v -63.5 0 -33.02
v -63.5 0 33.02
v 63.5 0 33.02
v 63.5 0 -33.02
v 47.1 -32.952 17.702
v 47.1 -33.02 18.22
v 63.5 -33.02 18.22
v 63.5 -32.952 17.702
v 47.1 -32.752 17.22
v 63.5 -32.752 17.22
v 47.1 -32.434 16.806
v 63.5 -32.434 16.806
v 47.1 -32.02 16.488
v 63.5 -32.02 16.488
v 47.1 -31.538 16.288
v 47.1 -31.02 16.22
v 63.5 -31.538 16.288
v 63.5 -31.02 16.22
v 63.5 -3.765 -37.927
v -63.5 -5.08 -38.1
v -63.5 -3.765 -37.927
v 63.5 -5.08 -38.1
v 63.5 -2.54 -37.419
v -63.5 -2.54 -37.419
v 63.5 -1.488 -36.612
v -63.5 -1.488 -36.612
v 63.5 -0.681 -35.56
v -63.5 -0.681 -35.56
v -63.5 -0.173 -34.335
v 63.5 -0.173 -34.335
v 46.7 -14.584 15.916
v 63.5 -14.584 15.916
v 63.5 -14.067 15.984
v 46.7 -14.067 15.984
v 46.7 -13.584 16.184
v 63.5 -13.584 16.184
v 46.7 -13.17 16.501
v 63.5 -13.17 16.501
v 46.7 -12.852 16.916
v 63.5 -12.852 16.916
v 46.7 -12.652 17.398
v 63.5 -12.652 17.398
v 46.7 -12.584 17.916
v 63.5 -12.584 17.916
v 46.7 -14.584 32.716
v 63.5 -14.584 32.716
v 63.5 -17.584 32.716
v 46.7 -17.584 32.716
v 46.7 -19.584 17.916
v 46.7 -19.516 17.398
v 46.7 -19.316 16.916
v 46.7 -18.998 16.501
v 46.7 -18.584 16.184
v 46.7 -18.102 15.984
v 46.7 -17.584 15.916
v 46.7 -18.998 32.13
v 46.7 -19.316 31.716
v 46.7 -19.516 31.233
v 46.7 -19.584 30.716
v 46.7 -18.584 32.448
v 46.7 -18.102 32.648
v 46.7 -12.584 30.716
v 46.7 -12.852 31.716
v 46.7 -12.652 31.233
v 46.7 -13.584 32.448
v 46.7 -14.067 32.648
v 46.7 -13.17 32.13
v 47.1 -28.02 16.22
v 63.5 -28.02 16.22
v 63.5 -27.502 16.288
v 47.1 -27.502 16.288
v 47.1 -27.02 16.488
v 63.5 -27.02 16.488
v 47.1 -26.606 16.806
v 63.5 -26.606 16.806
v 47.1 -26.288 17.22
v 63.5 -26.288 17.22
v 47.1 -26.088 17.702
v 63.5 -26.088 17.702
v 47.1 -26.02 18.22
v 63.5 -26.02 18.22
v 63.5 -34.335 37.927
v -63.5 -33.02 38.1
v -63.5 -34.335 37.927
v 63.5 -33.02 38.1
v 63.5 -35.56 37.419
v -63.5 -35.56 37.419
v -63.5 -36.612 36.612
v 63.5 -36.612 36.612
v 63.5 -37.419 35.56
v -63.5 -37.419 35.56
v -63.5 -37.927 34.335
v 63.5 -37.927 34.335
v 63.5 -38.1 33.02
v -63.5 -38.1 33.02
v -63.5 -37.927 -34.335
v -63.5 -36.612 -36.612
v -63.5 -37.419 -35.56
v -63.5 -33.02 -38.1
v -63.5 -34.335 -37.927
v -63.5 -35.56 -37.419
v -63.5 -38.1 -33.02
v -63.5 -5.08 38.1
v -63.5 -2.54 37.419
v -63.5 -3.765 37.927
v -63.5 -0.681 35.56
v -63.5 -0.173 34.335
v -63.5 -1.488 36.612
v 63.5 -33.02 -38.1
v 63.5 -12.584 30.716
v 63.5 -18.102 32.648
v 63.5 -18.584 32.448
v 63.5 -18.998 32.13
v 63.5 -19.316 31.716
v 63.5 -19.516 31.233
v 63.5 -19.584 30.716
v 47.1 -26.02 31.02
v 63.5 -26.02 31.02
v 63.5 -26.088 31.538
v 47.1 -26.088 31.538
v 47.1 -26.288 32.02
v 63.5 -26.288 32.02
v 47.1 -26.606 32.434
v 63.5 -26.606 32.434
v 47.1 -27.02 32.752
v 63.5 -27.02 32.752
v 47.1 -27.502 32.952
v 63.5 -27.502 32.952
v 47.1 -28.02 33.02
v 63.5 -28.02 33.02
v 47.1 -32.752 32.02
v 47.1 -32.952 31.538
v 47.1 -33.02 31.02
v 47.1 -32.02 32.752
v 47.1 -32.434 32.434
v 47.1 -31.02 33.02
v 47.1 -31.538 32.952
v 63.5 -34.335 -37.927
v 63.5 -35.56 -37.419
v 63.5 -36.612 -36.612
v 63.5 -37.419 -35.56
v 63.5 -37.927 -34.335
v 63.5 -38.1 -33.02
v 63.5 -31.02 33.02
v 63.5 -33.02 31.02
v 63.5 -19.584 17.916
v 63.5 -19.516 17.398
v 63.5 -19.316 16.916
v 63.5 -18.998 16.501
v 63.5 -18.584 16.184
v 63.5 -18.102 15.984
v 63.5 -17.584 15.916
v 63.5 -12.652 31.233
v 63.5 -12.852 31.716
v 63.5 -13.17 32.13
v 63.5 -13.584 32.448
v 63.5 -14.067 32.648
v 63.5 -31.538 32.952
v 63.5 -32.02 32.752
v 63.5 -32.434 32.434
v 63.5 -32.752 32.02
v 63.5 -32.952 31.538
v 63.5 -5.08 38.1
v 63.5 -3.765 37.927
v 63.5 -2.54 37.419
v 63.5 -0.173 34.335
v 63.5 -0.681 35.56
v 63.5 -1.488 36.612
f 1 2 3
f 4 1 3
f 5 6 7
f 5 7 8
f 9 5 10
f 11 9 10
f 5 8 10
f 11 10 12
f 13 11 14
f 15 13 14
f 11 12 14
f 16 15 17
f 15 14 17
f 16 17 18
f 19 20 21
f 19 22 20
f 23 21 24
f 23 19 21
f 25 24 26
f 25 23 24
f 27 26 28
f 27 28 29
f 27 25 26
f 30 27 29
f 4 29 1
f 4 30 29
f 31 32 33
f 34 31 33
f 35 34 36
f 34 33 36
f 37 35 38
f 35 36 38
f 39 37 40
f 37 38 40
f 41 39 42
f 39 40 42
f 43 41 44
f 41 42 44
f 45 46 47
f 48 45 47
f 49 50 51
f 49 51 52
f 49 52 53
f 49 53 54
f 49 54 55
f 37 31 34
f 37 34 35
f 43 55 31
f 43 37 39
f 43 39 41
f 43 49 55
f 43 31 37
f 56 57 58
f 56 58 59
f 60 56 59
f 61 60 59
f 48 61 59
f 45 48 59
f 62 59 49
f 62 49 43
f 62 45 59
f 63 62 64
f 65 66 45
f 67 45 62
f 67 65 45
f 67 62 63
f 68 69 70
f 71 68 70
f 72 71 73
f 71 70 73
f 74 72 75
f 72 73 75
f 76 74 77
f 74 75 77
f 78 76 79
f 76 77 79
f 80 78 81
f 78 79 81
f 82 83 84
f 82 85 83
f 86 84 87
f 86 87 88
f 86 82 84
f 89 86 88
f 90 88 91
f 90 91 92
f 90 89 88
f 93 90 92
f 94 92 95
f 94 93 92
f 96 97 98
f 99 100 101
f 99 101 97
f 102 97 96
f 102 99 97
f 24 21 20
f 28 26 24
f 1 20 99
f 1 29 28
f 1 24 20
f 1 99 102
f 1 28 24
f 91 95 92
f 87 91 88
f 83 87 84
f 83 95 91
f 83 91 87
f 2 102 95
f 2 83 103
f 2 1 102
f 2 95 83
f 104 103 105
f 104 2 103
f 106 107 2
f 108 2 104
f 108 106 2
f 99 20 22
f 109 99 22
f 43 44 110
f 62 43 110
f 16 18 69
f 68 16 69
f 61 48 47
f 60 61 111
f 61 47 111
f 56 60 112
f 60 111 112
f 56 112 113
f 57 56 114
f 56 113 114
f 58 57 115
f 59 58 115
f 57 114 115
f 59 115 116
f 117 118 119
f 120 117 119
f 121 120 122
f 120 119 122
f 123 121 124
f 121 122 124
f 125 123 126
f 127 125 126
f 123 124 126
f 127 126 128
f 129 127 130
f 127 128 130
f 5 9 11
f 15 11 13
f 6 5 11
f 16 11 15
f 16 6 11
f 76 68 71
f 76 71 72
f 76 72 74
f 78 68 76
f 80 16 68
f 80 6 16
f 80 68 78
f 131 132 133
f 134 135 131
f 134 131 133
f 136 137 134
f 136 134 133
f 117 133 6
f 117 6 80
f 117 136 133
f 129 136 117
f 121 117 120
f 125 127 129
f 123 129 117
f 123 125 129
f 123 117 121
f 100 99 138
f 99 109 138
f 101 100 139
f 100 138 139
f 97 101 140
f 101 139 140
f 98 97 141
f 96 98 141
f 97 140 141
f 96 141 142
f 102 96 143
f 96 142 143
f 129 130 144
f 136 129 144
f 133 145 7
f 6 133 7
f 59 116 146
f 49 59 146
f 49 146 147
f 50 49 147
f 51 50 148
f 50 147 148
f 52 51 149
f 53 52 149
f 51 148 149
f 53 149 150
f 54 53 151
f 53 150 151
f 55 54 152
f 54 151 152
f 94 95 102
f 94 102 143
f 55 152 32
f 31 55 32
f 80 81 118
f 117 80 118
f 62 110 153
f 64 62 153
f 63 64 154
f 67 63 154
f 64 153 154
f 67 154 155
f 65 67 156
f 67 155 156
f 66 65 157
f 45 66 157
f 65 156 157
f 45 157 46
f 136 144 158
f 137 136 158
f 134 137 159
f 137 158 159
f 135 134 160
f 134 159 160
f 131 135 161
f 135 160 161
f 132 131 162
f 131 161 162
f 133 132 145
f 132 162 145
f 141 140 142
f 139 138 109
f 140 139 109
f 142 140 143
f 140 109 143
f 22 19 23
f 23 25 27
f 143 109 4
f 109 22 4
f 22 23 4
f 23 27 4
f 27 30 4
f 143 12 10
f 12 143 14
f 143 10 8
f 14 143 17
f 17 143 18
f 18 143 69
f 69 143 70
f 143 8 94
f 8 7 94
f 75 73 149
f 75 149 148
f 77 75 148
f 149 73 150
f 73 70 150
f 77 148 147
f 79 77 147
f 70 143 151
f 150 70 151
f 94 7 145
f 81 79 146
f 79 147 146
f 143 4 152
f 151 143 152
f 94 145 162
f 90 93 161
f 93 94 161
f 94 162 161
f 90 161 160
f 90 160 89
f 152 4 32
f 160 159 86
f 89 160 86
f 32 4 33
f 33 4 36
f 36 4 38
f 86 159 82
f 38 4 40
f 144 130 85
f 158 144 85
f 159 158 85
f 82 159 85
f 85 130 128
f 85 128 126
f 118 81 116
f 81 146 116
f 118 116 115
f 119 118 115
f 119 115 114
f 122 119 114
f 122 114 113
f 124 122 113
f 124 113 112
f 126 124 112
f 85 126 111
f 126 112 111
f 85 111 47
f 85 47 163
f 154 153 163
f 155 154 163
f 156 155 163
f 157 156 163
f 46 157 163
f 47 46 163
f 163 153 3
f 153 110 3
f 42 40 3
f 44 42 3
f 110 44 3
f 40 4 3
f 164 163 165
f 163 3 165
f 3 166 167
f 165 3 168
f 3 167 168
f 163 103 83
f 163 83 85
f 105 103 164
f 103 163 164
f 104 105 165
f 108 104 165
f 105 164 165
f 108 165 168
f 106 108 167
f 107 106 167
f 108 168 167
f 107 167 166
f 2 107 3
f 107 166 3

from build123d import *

# Parameters (mm, degrees)
F0_W     = 127
F0_H     = 76.2
F1_DEPTH = 38.1
F2_R     = 5.08
F4_DEPTH = 16.4
F6_DEPTH = 16.8


with BuildPart() as f1:
    # F0 (on Front) → F1 (new body)
    with BuildSketch(Plane.XZ):
        Rectangle(F0_W, F0_H)
    extrude(amount=F1_DEPTH)

    # F2
    f2_edges = [f1.edges().sort_by_distance(p)[0] for p in [
        (0, -38.1, 38.1),
        (0, 0, 38.1),
        (0, -38.1, -38.1),
        (0, 0, -38.1),
    ]]
    fillet(f2_edges, radius=F2_R)

    # F3 (on face) → F4 (cut)
    with BuildSketch(Plane.YZ.offset(63.5)):
        with BuildLine():
            Line((-28.02, 33.02), (-31.02, 33.02))
            ThreePointArc((-31.02, 33.02), (-32.434214, 32.434214), (-33.02, 31.02))
            Line((-33.02, 31.02), (-33.02, 18.22))
            ThreePointArc((-33.02, 18.22), (-32.434214, 16.805786), (-31.02, 16.22))
            Line((-31.02, 16.22), (-28.02, 16.22))
            ThreePointArc((-28.02, 16.22), (-26.605786, 16.805786), (-26.02, 18.22))
            Line((-26.02, 18.22), (-26.02, 31.02))
            ThreePointArc((-26.02, 31.02), (-26.605786, 32.434214), (-28.02, 33.02))
        make_face()
    extrude(amount=-F4_DEPTH, mode=Mode.SUBTRACT)

    # F5 (on face) → F6 (cut)
    with BuildSketch(Plane.YZ.offset(63.5)):
        with BuildLine():
            Line((-14.584209, 32.715682), (-17.584209, 32.715682))
            ThreePointArc((-17.584209, 32.715682), (-18.998423, 32.129895), (-19.584209, 30.715682))
            Line((-19.584209, 30.715682), (-19.584209, 17.915682))
            ThreePointArc((-19.584209, 17.915682), (-18.998423, 16.501468), (-17.584209, 15.915682))
            Line((-17.584209, 15.915682), (-14.584209, 15.915682))
            ThreePointArc((-14.584209, 15.915682), (-13.169996, 16.501468), (-12.584209, 17.915682))
            Line((-12.584209, 17.915682), (-12.584209, 30.715682))
            ThreePointArc((-12.584209, 30.715682), (-13.169996, 32.129895), (-14.584209, 32.715682))
        make_face()
    extrude(amount=-F6_DEPTH, mode=Mode.SUBTRACT)


solid = f1.part
